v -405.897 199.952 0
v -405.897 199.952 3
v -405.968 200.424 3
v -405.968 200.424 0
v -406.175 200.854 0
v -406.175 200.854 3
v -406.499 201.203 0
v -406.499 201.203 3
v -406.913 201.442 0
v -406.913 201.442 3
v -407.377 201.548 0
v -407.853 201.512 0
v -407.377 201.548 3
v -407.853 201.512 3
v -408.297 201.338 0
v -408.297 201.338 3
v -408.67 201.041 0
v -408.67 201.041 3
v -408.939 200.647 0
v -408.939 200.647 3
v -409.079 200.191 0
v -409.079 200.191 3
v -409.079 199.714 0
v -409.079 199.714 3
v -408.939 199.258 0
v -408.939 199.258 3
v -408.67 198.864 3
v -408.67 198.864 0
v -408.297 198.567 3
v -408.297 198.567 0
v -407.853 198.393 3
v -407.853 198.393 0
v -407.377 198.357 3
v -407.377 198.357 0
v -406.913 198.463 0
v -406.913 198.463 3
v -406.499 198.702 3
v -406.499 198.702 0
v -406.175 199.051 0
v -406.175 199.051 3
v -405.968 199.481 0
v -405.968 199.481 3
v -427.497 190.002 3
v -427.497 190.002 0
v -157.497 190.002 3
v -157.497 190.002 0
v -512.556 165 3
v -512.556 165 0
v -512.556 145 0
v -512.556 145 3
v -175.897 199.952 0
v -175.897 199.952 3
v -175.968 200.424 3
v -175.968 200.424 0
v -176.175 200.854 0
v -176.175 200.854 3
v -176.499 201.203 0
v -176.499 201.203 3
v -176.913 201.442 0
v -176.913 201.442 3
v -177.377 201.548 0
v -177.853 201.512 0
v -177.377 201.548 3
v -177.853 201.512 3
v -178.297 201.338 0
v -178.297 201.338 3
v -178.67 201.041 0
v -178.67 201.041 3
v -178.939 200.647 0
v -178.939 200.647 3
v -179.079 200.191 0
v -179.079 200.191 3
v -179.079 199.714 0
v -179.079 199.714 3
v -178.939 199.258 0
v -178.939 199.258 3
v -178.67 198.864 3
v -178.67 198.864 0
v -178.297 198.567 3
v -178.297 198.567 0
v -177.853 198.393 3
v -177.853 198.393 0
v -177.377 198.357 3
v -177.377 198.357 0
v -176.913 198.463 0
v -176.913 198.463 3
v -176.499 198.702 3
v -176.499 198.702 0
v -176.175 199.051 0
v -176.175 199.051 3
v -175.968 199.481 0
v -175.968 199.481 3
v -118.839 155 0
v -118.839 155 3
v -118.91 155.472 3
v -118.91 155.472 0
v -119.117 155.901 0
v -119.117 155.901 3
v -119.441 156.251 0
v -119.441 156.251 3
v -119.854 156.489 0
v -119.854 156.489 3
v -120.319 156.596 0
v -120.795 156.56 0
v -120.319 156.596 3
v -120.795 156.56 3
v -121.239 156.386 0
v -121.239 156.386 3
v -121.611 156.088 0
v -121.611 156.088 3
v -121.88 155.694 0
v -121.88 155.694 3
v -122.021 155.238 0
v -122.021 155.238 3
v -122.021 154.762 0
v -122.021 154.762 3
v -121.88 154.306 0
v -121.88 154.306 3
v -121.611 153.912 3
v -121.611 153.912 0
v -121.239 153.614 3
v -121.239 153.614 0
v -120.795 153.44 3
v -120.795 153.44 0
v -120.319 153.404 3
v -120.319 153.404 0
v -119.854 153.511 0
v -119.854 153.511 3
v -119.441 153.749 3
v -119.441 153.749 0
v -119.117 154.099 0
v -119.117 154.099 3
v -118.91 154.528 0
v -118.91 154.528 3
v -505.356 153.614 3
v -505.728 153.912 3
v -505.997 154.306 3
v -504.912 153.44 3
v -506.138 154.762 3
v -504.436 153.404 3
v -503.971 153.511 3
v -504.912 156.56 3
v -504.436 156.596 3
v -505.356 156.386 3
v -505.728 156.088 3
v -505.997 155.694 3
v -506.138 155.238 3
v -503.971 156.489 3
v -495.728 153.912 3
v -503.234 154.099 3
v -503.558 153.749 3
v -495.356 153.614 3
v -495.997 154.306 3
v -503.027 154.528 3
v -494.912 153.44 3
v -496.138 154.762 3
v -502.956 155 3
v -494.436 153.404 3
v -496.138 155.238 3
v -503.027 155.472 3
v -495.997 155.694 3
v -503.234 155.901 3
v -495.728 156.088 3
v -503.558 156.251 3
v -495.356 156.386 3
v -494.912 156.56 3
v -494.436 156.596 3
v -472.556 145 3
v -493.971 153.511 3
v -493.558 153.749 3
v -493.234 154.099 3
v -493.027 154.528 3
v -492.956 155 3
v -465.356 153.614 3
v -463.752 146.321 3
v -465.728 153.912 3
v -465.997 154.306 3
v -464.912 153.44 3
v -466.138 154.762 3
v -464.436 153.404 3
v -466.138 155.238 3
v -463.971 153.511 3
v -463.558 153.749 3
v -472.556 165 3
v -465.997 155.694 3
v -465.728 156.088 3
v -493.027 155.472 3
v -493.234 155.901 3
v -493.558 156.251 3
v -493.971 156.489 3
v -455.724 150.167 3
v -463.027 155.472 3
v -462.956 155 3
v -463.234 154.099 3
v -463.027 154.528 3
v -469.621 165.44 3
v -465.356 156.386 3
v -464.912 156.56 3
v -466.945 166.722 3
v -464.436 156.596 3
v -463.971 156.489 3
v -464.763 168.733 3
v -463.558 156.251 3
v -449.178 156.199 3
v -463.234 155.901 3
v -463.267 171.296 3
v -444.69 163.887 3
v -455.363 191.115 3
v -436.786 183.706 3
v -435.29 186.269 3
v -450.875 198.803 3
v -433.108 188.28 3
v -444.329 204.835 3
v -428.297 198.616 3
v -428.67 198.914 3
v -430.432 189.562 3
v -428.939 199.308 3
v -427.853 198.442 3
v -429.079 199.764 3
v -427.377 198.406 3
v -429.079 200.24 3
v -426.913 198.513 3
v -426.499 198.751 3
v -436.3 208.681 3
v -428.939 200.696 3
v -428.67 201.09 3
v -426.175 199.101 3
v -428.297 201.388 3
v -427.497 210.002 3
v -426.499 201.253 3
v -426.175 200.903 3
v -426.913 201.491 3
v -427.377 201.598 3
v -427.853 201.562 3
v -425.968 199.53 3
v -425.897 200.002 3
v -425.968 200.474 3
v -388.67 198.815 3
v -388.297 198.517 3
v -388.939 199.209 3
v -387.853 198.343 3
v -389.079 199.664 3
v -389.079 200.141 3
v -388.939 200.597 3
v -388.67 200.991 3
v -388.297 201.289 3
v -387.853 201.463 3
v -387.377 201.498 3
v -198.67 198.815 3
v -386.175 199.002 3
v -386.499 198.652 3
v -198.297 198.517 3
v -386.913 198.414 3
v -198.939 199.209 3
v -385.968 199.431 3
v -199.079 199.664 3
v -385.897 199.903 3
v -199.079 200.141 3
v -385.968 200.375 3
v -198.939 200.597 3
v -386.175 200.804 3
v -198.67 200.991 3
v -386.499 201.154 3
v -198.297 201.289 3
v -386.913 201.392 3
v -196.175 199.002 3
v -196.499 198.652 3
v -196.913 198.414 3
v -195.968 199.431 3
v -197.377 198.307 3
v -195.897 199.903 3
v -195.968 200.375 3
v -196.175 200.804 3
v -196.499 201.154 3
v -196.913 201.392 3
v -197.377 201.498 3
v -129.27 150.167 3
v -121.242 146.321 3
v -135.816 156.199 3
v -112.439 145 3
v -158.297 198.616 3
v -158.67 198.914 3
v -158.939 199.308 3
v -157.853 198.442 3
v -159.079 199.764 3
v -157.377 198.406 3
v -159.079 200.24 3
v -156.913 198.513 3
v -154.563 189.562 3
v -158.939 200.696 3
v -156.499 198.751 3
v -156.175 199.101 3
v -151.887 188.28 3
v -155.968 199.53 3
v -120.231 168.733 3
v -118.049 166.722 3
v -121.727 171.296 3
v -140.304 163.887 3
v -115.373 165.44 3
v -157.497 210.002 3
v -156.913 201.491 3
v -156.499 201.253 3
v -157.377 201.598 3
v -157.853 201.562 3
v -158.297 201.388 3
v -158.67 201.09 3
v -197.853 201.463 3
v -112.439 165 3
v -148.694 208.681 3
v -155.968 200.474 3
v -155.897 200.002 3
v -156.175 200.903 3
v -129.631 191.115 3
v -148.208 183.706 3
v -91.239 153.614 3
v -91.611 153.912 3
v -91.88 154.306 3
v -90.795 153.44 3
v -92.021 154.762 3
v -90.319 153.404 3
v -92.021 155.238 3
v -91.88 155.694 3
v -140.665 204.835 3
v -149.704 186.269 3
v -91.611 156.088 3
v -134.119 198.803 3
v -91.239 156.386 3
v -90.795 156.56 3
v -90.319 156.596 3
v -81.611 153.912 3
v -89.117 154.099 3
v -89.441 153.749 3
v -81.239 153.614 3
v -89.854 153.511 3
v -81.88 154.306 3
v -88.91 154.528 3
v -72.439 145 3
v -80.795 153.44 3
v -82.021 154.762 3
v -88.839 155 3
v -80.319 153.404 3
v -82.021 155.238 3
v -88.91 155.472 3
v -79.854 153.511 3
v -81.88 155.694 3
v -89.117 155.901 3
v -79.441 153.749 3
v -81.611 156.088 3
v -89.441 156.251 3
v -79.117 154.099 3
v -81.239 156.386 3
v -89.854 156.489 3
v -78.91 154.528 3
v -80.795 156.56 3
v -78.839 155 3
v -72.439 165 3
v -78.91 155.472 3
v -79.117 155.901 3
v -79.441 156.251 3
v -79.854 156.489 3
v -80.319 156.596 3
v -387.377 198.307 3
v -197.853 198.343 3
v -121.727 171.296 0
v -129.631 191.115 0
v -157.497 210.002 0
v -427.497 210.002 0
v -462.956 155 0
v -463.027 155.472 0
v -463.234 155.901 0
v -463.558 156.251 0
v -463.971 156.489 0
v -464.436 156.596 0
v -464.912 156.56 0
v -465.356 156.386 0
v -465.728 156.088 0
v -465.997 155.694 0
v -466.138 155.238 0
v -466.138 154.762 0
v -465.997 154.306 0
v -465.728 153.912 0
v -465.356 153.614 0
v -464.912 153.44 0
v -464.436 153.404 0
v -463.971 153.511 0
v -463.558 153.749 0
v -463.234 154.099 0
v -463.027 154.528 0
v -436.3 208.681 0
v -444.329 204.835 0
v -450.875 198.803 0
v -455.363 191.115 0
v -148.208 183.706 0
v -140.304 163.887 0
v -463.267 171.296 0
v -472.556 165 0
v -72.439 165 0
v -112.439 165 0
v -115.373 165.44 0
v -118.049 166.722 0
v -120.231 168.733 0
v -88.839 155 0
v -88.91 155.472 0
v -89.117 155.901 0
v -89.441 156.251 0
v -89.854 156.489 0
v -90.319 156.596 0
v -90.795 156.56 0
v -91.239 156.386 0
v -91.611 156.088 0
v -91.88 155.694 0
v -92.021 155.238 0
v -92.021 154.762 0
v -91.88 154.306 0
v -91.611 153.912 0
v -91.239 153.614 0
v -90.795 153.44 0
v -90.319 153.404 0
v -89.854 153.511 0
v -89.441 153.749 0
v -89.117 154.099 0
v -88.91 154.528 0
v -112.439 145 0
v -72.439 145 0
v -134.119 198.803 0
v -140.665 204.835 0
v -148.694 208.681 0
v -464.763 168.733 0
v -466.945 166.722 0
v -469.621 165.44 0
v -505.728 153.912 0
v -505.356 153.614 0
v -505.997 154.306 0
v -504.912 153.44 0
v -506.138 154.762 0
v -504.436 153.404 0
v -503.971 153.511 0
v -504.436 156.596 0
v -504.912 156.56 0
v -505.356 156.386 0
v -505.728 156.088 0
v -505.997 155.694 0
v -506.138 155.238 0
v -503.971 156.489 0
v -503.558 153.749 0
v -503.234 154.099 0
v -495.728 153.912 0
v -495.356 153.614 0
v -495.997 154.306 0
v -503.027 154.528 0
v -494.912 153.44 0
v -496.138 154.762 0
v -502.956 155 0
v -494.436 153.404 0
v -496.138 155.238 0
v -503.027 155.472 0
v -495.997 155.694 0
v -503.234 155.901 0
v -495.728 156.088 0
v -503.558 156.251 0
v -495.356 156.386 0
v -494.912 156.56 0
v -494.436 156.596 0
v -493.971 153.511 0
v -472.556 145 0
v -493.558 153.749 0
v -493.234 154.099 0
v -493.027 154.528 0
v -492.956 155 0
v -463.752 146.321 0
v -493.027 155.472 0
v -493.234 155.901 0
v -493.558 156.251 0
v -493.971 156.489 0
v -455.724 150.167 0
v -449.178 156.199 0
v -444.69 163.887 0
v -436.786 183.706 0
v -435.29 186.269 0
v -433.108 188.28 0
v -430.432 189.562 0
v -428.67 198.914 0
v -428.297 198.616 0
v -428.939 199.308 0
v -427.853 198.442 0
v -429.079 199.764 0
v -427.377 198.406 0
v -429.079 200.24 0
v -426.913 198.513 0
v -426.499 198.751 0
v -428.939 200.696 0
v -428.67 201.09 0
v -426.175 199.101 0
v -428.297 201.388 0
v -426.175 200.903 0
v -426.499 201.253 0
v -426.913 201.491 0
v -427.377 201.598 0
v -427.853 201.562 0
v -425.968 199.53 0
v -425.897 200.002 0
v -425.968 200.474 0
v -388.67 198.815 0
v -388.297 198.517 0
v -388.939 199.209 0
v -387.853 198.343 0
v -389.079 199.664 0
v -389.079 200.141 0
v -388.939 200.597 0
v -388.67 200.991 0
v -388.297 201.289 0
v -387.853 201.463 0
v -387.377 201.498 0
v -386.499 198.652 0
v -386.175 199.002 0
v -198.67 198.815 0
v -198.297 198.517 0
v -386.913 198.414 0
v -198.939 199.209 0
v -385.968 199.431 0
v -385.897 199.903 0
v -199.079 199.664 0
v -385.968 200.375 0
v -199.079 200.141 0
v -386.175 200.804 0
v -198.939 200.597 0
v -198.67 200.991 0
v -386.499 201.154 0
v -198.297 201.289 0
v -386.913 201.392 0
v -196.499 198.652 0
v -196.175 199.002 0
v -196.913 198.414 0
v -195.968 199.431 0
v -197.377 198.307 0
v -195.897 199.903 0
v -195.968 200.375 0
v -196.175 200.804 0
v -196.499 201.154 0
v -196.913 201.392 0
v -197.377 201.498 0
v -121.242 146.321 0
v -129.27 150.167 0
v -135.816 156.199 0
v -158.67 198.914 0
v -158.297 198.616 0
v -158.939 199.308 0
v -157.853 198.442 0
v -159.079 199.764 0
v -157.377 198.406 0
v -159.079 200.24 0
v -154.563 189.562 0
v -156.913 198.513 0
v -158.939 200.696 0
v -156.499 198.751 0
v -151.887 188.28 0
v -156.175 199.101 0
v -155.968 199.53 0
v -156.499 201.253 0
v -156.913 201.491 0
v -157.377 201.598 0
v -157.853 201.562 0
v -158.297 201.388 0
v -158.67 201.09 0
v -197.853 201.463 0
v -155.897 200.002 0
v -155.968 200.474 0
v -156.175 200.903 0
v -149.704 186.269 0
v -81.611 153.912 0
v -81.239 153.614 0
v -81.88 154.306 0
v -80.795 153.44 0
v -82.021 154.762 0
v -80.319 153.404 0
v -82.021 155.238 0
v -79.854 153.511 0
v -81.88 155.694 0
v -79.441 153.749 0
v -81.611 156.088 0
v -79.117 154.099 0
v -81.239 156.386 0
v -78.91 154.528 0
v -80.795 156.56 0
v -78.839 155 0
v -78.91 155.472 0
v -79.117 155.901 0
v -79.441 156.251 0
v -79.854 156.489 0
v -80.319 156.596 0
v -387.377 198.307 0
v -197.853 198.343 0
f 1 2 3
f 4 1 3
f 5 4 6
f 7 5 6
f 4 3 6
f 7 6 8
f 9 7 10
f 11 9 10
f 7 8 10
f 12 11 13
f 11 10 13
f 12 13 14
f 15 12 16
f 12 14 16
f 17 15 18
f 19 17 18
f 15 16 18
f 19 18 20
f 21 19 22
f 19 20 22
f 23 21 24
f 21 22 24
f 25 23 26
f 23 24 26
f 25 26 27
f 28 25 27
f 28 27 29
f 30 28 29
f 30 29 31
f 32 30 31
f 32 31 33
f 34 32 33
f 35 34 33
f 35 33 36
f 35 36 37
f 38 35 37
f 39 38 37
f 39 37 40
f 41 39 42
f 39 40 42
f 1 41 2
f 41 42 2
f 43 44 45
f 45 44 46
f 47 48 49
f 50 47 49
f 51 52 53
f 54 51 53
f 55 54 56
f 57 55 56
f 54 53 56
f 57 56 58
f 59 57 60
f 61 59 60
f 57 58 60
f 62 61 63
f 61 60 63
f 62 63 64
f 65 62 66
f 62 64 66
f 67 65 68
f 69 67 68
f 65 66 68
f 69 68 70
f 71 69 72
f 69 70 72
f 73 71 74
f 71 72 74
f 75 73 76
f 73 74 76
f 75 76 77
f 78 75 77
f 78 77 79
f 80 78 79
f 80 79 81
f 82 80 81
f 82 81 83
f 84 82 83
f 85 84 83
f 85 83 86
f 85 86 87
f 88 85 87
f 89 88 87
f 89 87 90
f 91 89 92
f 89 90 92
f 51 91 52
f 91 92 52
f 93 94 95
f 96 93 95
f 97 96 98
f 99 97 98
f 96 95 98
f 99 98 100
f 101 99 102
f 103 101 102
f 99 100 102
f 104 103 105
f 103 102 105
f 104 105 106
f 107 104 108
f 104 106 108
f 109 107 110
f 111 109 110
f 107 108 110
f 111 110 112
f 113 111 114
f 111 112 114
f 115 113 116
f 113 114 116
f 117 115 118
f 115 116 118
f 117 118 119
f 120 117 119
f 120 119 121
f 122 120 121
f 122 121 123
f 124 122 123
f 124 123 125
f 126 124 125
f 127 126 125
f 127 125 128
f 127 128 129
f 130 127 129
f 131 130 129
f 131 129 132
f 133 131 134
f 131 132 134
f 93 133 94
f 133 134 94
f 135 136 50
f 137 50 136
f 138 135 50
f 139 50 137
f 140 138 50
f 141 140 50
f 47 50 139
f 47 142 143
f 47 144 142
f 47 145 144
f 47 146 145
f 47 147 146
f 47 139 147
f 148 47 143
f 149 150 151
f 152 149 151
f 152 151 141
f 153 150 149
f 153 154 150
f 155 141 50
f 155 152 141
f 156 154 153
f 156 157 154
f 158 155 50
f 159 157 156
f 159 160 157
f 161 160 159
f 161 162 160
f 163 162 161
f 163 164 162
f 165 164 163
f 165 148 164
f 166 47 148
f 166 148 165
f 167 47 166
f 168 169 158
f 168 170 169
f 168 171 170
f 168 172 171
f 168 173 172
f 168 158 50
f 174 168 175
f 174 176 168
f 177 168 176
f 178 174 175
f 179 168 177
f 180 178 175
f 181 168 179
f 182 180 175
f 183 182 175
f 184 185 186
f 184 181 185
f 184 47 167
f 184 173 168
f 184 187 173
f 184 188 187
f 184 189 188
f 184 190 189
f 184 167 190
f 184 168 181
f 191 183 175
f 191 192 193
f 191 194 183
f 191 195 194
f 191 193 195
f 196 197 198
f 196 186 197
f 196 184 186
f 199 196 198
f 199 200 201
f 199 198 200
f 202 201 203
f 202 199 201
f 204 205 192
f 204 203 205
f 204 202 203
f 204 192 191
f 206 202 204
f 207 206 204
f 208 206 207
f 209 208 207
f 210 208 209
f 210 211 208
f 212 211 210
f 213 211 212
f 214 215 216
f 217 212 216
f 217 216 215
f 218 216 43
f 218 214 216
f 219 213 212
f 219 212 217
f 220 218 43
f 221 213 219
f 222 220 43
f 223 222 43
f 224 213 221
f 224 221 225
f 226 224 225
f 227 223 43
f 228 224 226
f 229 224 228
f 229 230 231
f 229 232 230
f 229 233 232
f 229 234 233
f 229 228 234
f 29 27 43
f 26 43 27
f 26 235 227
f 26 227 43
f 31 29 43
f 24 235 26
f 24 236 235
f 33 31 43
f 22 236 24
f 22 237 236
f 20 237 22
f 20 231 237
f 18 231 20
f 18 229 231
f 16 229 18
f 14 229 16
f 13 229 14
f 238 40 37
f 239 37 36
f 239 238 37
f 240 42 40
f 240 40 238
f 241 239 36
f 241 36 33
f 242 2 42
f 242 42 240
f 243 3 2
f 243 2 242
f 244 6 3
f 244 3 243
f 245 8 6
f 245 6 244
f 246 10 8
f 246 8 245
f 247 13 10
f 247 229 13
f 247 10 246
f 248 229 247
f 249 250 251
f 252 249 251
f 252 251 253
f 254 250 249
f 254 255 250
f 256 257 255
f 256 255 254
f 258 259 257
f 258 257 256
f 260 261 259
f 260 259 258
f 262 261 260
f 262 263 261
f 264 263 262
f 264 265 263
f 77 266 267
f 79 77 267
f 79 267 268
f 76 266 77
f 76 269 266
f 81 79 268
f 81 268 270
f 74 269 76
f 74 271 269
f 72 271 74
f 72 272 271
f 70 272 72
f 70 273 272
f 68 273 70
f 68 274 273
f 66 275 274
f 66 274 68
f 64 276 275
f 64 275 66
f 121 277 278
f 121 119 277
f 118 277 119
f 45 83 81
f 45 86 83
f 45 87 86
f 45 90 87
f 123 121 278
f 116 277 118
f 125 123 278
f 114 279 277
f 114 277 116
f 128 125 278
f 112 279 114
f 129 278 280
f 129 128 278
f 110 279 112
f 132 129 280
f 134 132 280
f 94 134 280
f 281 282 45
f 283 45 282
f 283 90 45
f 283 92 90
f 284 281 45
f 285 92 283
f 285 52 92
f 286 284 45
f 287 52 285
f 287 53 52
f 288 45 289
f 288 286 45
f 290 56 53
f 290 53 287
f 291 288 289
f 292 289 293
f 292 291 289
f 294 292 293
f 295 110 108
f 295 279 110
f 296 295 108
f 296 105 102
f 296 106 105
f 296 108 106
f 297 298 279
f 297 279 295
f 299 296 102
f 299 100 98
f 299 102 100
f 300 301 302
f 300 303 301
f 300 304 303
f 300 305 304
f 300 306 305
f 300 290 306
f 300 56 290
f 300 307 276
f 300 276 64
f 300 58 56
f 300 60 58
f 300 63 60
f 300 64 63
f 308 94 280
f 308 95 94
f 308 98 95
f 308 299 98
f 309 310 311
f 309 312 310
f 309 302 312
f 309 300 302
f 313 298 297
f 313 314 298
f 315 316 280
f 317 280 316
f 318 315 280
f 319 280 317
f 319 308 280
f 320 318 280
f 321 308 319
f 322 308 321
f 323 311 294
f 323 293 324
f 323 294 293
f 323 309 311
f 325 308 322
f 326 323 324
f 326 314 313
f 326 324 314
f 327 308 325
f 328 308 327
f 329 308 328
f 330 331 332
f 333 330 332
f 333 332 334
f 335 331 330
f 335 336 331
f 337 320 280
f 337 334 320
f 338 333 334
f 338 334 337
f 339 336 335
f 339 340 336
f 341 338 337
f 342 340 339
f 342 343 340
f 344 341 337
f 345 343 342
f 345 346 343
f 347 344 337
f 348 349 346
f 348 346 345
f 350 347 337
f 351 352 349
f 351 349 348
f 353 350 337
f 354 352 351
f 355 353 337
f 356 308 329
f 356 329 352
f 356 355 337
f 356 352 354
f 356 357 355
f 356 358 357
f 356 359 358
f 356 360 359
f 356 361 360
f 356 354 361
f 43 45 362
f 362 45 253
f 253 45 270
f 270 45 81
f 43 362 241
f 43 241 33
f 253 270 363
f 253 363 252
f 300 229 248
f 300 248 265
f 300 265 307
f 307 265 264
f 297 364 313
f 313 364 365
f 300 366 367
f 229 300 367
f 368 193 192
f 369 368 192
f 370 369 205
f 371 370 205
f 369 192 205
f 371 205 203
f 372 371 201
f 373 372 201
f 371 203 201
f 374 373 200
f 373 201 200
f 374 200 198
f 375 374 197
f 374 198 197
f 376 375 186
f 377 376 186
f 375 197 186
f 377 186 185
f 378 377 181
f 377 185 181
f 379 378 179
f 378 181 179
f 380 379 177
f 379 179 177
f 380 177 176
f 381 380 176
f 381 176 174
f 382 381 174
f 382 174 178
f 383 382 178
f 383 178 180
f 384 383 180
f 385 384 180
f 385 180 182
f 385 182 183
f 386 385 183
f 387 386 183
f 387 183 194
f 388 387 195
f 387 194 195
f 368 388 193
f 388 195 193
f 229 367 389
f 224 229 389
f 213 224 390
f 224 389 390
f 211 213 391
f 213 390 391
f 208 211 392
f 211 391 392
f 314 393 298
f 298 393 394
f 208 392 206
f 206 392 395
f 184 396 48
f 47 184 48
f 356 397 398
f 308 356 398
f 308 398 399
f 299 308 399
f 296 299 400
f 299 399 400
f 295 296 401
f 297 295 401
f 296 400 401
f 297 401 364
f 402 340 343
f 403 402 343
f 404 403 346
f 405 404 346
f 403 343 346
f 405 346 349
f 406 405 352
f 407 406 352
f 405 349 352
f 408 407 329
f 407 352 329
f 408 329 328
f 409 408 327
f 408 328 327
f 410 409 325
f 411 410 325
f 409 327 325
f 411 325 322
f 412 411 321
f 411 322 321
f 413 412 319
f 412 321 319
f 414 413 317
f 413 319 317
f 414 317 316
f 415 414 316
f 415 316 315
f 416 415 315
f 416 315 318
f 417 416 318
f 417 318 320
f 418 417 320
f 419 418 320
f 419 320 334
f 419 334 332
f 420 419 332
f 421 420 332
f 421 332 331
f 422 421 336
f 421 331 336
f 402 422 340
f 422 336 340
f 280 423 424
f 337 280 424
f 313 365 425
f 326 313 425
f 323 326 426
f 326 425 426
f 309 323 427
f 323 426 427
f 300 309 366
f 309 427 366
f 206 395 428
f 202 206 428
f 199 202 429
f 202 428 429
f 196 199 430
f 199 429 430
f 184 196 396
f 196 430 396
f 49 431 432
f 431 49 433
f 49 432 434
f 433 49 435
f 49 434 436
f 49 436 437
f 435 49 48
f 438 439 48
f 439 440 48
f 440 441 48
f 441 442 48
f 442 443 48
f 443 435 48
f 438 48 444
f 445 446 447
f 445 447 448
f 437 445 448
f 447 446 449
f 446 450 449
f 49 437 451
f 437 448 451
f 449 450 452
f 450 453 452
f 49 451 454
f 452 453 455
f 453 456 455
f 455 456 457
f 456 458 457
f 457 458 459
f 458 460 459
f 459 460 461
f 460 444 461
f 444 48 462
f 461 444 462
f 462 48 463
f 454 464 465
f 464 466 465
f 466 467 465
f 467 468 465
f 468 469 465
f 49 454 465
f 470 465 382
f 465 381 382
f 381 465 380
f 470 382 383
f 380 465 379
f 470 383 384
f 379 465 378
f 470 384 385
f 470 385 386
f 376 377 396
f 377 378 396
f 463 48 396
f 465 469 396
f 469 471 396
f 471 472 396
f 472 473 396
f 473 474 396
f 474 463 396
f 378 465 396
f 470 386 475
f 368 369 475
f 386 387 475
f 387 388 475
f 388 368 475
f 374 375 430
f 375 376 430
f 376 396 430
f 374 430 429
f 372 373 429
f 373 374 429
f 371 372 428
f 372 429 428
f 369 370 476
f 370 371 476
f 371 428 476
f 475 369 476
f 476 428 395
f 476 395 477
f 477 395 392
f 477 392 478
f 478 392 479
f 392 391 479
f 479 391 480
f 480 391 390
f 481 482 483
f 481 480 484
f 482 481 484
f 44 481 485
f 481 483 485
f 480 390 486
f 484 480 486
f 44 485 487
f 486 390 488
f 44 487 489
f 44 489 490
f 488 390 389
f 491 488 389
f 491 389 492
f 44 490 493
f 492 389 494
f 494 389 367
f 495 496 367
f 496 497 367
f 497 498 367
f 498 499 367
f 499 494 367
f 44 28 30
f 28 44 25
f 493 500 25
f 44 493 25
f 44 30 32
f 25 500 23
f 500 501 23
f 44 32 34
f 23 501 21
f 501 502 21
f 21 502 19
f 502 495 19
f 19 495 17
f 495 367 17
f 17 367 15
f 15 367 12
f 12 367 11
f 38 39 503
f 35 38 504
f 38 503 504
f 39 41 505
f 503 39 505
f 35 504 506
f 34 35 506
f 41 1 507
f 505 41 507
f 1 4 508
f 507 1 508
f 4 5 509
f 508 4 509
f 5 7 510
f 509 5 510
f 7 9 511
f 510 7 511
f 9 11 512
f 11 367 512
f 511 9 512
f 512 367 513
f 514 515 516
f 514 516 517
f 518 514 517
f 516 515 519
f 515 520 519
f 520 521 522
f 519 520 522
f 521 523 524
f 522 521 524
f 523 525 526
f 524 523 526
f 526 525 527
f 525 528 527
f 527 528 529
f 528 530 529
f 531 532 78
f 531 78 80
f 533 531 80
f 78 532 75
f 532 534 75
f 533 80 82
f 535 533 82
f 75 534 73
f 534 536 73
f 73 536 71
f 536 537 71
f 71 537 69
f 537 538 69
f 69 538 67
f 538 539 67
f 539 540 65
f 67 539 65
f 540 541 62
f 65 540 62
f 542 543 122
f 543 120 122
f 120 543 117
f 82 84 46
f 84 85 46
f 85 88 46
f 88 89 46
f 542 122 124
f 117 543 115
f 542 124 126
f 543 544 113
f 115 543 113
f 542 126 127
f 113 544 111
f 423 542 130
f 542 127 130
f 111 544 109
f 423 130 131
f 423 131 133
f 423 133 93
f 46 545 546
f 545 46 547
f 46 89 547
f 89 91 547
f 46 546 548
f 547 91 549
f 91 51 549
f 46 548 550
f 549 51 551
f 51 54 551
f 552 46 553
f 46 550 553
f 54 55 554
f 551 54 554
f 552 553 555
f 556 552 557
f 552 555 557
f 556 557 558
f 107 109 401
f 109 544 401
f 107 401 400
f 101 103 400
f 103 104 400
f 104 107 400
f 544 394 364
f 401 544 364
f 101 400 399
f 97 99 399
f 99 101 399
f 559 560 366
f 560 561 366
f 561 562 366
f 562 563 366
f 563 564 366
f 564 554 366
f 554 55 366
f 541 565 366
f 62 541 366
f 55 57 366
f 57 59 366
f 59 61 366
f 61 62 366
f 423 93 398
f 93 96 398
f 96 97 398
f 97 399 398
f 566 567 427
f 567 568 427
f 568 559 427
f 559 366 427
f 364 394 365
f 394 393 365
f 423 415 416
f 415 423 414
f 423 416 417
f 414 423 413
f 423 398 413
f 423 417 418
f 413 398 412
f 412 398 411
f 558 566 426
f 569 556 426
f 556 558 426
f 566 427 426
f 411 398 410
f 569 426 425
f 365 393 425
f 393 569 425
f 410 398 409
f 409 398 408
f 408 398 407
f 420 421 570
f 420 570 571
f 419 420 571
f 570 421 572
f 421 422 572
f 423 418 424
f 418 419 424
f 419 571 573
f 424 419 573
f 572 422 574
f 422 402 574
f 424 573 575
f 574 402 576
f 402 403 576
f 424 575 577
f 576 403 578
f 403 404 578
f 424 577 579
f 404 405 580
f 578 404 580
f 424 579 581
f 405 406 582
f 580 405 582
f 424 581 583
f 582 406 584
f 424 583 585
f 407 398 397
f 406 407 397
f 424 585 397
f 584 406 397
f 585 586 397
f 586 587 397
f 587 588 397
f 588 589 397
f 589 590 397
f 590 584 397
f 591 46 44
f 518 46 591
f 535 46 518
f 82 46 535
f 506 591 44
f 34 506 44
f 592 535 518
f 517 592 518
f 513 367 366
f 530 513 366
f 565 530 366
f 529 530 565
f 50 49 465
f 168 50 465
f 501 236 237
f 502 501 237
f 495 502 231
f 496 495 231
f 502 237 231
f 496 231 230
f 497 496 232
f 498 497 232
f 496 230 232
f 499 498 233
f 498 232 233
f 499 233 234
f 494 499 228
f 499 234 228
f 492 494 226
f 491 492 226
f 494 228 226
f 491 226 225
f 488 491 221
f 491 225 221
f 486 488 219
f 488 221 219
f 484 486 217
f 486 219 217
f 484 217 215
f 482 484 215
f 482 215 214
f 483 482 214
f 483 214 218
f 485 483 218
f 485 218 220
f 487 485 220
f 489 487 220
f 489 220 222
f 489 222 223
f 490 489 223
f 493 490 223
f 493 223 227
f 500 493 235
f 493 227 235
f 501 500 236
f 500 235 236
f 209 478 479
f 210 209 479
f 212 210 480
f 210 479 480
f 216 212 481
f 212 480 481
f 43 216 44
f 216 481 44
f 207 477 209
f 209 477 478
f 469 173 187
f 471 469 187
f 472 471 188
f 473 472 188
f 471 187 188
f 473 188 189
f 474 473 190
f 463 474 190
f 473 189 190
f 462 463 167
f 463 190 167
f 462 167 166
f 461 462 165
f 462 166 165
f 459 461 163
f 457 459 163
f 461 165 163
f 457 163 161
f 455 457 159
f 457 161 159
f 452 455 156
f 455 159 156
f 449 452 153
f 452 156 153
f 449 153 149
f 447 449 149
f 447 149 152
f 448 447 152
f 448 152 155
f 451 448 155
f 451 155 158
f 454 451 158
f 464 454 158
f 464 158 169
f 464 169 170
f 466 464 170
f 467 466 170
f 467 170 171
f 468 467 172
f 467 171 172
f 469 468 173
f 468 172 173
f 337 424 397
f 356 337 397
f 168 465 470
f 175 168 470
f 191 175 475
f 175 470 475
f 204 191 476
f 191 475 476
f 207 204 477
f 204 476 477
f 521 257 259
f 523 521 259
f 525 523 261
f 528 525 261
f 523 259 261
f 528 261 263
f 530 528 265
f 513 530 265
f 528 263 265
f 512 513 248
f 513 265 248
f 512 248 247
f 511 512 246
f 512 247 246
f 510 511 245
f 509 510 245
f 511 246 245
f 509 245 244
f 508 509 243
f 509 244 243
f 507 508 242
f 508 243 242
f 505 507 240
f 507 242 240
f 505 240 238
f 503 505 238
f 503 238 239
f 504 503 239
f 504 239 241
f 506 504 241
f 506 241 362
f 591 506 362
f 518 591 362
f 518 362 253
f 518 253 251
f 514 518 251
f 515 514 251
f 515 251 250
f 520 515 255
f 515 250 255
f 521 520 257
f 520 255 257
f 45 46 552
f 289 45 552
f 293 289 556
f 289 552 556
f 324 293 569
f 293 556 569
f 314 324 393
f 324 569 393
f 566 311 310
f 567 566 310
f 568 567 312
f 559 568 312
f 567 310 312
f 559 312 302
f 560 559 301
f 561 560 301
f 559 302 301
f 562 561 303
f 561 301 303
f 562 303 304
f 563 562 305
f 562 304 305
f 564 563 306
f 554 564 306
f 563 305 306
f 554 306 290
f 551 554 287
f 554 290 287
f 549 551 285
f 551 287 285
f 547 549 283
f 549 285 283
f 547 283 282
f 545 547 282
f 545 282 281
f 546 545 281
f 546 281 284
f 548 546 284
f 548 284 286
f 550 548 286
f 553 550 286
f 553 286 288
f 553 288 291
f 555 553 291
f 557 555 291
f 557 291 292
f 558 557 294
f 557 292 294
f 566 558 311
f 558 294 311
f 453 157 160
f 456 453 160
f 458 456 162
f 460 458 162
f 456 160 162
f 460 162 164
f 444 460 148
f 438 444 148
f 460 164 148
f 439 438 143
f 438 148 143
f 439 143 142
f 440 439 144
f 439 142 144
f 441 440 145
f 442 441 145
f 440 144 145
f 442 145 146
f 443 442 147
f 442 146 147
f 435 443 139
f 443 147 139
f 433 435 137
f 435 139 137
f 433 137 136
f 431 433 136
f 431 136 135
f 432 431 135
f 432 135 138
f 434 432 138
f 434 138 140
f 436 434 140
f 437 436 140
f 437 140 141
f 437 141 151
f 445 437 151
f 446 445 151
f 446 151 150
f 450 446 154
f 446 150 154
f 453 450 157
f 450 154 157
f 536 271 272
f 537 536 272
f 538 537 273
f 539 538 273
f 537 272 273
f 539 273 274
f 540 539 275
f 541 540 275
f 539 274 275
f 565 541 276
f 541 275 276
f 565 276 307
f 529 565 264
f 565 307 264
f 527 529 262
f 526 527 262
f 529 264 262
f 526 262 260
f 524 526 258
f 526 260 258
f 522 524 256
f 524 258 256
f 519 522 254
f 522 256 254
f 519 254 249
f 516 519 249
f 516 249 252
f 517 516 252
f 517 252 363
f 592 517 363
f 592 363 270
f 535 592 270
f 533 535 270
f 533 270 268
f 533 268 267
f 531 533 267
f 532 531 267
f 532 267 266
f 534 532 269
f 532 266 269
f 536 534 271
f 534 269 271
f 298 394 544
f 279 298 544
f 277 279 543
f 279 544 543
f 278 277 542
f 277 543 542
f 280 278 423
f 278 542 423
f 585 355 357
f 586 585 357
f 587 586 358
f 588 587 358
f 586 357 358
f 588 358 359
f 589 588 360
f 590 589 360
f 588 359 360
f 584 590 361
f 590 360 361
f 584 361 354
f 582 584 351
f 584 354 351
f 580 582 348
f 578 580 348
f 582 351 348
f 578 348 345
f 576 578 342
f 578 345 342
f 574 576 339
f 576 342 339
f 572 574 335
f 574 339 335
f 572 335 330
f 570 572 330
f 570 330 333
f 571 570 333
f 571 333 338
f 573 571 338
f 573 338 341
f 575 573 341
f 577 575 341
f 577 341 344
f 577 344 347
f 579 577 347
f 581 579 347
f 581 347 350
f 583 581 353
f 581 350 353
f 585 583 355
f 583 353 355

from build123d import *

# Parameters (mm, degrees)
EXTRUDE1_DEPTH     = 3
SKETCH2_R          = 1.6
CUT_EXTRUDE1_DEPTH = 3


with BuildPart() as part:
    # Sketch1 → Extrude1 (new body)
    with BuildSketch(Plane.XY):
        with BuildLine():
            Line((-512.555561166, 145), (-472.555561166, 145))
            ThreePointArc((-472.555561166, 145), (-455.723951498, 150.166616904), (-444.689840432, 163.886872268))
            Line((-444.689840432, 163.886872268), (-436.785621791, 183.706382542))
            ThreePointArc((-436.785621791, 183.706382542), (-433.10758477, 188.279800996), (-427.497048214, 190.002006631))
            Line((-427.497048214, 190.002006631), (-157.497048214, 190.002006631))
            ThreePointArc((-157.497048214, 190.002006631), (-151.886511658, 188.279800996), (-148.208474636, 183.706382542))
            Line((-148.208474636, 183.706382542), (-140.304255995, 163.886872268))
            ThreePointArc((-140.304255995, 163.886872268), (-129.270144929, 150.166616904), (-112.438535261, 145))
            Line((-112.438535261, 145), (-72.438535261, 145))
            Line((-72.438535261, 145), (-72.438535261, 165))
            Line((-72.438535261, 165), (-112.438535261, 165))
            ThreePointArc((-112.438535261, 165), (-118.049071817, 166.722205635), (-121.727108839, 171.295624089))
            Line((-121.727108839, 171.295624089), (-129.63132748, 191.115134363))
            ThreePointArc((-129.63132748, 191.115134363), (-140.665438546, 204.835389727), (-157.497048214, 210.002006631))
            Line((-157.497048214, 210.002006631), (-427.497048214, 210.002006631))
            ThreePointArc((-427.497048214, 210.002006631), (-444.328657882, 204.835389727), (-455.362768947, 191.115134363))
            Line((-455.362768947, 191.115134363), (-463.266987588, 171.295624089))
            ThreePointArc((-463.266987588, 171.295624089), (-466.94502461, 166.722205635), (-472.555561166, 165))
            Line((-472.555561166, 165), (-512.555561166, 165))
            Line((-512.555561166, 165), (-512.555561166, 145))
        make_face()
    extrude(amount=EXTRUDE1_DEPTH)

    # Sketch2 → Cut-Extrude1 (cut)
    with BuildSketch(Plane.XY.offset(3)):
        with Locations((-494.555561166, 155)):
            Circle(SKETCH2_R)
        with Locations((-464.555561166, 155)):
            Circle(SKETCH2_R)
        with Locations((-427.497048214, 200.002006631)):
            Circle(SKETCH2_R)
        with Locations((-407.497048214, 199.95245399)):
            Circle(SKETCH2_R)
        with Locations((-387.497048214, 199.90290135)):
            Circle(SKETCH2_R)
        with Locations((-504.555561166, 155)):
            Circle(SKETCH2_R)
        with Locations((-80.438535261, 155)):
            Circle(SKETCH2_R)
        with Locations((-197.497048214, 199.90290135)):
            Circle(SKETCH2_R)
        with Locations((-177.497048214, 199.95245399)):
            Circle(SKETCH2_R)
        with Locations((-157.497048214, 200.002006631)):
            Circle(SKETCH2_R)
        with Locations((-120.438535261, 155)):
            Circle(SKETCH2_R)
        with Locations((-90.438535261, 155)):
            Circle(SKETCH2_R)
    extrude(amount=-CUT_EXTRUDE1_DEPTH, mode=Mode.SUBTRACT)


solid = part.part
